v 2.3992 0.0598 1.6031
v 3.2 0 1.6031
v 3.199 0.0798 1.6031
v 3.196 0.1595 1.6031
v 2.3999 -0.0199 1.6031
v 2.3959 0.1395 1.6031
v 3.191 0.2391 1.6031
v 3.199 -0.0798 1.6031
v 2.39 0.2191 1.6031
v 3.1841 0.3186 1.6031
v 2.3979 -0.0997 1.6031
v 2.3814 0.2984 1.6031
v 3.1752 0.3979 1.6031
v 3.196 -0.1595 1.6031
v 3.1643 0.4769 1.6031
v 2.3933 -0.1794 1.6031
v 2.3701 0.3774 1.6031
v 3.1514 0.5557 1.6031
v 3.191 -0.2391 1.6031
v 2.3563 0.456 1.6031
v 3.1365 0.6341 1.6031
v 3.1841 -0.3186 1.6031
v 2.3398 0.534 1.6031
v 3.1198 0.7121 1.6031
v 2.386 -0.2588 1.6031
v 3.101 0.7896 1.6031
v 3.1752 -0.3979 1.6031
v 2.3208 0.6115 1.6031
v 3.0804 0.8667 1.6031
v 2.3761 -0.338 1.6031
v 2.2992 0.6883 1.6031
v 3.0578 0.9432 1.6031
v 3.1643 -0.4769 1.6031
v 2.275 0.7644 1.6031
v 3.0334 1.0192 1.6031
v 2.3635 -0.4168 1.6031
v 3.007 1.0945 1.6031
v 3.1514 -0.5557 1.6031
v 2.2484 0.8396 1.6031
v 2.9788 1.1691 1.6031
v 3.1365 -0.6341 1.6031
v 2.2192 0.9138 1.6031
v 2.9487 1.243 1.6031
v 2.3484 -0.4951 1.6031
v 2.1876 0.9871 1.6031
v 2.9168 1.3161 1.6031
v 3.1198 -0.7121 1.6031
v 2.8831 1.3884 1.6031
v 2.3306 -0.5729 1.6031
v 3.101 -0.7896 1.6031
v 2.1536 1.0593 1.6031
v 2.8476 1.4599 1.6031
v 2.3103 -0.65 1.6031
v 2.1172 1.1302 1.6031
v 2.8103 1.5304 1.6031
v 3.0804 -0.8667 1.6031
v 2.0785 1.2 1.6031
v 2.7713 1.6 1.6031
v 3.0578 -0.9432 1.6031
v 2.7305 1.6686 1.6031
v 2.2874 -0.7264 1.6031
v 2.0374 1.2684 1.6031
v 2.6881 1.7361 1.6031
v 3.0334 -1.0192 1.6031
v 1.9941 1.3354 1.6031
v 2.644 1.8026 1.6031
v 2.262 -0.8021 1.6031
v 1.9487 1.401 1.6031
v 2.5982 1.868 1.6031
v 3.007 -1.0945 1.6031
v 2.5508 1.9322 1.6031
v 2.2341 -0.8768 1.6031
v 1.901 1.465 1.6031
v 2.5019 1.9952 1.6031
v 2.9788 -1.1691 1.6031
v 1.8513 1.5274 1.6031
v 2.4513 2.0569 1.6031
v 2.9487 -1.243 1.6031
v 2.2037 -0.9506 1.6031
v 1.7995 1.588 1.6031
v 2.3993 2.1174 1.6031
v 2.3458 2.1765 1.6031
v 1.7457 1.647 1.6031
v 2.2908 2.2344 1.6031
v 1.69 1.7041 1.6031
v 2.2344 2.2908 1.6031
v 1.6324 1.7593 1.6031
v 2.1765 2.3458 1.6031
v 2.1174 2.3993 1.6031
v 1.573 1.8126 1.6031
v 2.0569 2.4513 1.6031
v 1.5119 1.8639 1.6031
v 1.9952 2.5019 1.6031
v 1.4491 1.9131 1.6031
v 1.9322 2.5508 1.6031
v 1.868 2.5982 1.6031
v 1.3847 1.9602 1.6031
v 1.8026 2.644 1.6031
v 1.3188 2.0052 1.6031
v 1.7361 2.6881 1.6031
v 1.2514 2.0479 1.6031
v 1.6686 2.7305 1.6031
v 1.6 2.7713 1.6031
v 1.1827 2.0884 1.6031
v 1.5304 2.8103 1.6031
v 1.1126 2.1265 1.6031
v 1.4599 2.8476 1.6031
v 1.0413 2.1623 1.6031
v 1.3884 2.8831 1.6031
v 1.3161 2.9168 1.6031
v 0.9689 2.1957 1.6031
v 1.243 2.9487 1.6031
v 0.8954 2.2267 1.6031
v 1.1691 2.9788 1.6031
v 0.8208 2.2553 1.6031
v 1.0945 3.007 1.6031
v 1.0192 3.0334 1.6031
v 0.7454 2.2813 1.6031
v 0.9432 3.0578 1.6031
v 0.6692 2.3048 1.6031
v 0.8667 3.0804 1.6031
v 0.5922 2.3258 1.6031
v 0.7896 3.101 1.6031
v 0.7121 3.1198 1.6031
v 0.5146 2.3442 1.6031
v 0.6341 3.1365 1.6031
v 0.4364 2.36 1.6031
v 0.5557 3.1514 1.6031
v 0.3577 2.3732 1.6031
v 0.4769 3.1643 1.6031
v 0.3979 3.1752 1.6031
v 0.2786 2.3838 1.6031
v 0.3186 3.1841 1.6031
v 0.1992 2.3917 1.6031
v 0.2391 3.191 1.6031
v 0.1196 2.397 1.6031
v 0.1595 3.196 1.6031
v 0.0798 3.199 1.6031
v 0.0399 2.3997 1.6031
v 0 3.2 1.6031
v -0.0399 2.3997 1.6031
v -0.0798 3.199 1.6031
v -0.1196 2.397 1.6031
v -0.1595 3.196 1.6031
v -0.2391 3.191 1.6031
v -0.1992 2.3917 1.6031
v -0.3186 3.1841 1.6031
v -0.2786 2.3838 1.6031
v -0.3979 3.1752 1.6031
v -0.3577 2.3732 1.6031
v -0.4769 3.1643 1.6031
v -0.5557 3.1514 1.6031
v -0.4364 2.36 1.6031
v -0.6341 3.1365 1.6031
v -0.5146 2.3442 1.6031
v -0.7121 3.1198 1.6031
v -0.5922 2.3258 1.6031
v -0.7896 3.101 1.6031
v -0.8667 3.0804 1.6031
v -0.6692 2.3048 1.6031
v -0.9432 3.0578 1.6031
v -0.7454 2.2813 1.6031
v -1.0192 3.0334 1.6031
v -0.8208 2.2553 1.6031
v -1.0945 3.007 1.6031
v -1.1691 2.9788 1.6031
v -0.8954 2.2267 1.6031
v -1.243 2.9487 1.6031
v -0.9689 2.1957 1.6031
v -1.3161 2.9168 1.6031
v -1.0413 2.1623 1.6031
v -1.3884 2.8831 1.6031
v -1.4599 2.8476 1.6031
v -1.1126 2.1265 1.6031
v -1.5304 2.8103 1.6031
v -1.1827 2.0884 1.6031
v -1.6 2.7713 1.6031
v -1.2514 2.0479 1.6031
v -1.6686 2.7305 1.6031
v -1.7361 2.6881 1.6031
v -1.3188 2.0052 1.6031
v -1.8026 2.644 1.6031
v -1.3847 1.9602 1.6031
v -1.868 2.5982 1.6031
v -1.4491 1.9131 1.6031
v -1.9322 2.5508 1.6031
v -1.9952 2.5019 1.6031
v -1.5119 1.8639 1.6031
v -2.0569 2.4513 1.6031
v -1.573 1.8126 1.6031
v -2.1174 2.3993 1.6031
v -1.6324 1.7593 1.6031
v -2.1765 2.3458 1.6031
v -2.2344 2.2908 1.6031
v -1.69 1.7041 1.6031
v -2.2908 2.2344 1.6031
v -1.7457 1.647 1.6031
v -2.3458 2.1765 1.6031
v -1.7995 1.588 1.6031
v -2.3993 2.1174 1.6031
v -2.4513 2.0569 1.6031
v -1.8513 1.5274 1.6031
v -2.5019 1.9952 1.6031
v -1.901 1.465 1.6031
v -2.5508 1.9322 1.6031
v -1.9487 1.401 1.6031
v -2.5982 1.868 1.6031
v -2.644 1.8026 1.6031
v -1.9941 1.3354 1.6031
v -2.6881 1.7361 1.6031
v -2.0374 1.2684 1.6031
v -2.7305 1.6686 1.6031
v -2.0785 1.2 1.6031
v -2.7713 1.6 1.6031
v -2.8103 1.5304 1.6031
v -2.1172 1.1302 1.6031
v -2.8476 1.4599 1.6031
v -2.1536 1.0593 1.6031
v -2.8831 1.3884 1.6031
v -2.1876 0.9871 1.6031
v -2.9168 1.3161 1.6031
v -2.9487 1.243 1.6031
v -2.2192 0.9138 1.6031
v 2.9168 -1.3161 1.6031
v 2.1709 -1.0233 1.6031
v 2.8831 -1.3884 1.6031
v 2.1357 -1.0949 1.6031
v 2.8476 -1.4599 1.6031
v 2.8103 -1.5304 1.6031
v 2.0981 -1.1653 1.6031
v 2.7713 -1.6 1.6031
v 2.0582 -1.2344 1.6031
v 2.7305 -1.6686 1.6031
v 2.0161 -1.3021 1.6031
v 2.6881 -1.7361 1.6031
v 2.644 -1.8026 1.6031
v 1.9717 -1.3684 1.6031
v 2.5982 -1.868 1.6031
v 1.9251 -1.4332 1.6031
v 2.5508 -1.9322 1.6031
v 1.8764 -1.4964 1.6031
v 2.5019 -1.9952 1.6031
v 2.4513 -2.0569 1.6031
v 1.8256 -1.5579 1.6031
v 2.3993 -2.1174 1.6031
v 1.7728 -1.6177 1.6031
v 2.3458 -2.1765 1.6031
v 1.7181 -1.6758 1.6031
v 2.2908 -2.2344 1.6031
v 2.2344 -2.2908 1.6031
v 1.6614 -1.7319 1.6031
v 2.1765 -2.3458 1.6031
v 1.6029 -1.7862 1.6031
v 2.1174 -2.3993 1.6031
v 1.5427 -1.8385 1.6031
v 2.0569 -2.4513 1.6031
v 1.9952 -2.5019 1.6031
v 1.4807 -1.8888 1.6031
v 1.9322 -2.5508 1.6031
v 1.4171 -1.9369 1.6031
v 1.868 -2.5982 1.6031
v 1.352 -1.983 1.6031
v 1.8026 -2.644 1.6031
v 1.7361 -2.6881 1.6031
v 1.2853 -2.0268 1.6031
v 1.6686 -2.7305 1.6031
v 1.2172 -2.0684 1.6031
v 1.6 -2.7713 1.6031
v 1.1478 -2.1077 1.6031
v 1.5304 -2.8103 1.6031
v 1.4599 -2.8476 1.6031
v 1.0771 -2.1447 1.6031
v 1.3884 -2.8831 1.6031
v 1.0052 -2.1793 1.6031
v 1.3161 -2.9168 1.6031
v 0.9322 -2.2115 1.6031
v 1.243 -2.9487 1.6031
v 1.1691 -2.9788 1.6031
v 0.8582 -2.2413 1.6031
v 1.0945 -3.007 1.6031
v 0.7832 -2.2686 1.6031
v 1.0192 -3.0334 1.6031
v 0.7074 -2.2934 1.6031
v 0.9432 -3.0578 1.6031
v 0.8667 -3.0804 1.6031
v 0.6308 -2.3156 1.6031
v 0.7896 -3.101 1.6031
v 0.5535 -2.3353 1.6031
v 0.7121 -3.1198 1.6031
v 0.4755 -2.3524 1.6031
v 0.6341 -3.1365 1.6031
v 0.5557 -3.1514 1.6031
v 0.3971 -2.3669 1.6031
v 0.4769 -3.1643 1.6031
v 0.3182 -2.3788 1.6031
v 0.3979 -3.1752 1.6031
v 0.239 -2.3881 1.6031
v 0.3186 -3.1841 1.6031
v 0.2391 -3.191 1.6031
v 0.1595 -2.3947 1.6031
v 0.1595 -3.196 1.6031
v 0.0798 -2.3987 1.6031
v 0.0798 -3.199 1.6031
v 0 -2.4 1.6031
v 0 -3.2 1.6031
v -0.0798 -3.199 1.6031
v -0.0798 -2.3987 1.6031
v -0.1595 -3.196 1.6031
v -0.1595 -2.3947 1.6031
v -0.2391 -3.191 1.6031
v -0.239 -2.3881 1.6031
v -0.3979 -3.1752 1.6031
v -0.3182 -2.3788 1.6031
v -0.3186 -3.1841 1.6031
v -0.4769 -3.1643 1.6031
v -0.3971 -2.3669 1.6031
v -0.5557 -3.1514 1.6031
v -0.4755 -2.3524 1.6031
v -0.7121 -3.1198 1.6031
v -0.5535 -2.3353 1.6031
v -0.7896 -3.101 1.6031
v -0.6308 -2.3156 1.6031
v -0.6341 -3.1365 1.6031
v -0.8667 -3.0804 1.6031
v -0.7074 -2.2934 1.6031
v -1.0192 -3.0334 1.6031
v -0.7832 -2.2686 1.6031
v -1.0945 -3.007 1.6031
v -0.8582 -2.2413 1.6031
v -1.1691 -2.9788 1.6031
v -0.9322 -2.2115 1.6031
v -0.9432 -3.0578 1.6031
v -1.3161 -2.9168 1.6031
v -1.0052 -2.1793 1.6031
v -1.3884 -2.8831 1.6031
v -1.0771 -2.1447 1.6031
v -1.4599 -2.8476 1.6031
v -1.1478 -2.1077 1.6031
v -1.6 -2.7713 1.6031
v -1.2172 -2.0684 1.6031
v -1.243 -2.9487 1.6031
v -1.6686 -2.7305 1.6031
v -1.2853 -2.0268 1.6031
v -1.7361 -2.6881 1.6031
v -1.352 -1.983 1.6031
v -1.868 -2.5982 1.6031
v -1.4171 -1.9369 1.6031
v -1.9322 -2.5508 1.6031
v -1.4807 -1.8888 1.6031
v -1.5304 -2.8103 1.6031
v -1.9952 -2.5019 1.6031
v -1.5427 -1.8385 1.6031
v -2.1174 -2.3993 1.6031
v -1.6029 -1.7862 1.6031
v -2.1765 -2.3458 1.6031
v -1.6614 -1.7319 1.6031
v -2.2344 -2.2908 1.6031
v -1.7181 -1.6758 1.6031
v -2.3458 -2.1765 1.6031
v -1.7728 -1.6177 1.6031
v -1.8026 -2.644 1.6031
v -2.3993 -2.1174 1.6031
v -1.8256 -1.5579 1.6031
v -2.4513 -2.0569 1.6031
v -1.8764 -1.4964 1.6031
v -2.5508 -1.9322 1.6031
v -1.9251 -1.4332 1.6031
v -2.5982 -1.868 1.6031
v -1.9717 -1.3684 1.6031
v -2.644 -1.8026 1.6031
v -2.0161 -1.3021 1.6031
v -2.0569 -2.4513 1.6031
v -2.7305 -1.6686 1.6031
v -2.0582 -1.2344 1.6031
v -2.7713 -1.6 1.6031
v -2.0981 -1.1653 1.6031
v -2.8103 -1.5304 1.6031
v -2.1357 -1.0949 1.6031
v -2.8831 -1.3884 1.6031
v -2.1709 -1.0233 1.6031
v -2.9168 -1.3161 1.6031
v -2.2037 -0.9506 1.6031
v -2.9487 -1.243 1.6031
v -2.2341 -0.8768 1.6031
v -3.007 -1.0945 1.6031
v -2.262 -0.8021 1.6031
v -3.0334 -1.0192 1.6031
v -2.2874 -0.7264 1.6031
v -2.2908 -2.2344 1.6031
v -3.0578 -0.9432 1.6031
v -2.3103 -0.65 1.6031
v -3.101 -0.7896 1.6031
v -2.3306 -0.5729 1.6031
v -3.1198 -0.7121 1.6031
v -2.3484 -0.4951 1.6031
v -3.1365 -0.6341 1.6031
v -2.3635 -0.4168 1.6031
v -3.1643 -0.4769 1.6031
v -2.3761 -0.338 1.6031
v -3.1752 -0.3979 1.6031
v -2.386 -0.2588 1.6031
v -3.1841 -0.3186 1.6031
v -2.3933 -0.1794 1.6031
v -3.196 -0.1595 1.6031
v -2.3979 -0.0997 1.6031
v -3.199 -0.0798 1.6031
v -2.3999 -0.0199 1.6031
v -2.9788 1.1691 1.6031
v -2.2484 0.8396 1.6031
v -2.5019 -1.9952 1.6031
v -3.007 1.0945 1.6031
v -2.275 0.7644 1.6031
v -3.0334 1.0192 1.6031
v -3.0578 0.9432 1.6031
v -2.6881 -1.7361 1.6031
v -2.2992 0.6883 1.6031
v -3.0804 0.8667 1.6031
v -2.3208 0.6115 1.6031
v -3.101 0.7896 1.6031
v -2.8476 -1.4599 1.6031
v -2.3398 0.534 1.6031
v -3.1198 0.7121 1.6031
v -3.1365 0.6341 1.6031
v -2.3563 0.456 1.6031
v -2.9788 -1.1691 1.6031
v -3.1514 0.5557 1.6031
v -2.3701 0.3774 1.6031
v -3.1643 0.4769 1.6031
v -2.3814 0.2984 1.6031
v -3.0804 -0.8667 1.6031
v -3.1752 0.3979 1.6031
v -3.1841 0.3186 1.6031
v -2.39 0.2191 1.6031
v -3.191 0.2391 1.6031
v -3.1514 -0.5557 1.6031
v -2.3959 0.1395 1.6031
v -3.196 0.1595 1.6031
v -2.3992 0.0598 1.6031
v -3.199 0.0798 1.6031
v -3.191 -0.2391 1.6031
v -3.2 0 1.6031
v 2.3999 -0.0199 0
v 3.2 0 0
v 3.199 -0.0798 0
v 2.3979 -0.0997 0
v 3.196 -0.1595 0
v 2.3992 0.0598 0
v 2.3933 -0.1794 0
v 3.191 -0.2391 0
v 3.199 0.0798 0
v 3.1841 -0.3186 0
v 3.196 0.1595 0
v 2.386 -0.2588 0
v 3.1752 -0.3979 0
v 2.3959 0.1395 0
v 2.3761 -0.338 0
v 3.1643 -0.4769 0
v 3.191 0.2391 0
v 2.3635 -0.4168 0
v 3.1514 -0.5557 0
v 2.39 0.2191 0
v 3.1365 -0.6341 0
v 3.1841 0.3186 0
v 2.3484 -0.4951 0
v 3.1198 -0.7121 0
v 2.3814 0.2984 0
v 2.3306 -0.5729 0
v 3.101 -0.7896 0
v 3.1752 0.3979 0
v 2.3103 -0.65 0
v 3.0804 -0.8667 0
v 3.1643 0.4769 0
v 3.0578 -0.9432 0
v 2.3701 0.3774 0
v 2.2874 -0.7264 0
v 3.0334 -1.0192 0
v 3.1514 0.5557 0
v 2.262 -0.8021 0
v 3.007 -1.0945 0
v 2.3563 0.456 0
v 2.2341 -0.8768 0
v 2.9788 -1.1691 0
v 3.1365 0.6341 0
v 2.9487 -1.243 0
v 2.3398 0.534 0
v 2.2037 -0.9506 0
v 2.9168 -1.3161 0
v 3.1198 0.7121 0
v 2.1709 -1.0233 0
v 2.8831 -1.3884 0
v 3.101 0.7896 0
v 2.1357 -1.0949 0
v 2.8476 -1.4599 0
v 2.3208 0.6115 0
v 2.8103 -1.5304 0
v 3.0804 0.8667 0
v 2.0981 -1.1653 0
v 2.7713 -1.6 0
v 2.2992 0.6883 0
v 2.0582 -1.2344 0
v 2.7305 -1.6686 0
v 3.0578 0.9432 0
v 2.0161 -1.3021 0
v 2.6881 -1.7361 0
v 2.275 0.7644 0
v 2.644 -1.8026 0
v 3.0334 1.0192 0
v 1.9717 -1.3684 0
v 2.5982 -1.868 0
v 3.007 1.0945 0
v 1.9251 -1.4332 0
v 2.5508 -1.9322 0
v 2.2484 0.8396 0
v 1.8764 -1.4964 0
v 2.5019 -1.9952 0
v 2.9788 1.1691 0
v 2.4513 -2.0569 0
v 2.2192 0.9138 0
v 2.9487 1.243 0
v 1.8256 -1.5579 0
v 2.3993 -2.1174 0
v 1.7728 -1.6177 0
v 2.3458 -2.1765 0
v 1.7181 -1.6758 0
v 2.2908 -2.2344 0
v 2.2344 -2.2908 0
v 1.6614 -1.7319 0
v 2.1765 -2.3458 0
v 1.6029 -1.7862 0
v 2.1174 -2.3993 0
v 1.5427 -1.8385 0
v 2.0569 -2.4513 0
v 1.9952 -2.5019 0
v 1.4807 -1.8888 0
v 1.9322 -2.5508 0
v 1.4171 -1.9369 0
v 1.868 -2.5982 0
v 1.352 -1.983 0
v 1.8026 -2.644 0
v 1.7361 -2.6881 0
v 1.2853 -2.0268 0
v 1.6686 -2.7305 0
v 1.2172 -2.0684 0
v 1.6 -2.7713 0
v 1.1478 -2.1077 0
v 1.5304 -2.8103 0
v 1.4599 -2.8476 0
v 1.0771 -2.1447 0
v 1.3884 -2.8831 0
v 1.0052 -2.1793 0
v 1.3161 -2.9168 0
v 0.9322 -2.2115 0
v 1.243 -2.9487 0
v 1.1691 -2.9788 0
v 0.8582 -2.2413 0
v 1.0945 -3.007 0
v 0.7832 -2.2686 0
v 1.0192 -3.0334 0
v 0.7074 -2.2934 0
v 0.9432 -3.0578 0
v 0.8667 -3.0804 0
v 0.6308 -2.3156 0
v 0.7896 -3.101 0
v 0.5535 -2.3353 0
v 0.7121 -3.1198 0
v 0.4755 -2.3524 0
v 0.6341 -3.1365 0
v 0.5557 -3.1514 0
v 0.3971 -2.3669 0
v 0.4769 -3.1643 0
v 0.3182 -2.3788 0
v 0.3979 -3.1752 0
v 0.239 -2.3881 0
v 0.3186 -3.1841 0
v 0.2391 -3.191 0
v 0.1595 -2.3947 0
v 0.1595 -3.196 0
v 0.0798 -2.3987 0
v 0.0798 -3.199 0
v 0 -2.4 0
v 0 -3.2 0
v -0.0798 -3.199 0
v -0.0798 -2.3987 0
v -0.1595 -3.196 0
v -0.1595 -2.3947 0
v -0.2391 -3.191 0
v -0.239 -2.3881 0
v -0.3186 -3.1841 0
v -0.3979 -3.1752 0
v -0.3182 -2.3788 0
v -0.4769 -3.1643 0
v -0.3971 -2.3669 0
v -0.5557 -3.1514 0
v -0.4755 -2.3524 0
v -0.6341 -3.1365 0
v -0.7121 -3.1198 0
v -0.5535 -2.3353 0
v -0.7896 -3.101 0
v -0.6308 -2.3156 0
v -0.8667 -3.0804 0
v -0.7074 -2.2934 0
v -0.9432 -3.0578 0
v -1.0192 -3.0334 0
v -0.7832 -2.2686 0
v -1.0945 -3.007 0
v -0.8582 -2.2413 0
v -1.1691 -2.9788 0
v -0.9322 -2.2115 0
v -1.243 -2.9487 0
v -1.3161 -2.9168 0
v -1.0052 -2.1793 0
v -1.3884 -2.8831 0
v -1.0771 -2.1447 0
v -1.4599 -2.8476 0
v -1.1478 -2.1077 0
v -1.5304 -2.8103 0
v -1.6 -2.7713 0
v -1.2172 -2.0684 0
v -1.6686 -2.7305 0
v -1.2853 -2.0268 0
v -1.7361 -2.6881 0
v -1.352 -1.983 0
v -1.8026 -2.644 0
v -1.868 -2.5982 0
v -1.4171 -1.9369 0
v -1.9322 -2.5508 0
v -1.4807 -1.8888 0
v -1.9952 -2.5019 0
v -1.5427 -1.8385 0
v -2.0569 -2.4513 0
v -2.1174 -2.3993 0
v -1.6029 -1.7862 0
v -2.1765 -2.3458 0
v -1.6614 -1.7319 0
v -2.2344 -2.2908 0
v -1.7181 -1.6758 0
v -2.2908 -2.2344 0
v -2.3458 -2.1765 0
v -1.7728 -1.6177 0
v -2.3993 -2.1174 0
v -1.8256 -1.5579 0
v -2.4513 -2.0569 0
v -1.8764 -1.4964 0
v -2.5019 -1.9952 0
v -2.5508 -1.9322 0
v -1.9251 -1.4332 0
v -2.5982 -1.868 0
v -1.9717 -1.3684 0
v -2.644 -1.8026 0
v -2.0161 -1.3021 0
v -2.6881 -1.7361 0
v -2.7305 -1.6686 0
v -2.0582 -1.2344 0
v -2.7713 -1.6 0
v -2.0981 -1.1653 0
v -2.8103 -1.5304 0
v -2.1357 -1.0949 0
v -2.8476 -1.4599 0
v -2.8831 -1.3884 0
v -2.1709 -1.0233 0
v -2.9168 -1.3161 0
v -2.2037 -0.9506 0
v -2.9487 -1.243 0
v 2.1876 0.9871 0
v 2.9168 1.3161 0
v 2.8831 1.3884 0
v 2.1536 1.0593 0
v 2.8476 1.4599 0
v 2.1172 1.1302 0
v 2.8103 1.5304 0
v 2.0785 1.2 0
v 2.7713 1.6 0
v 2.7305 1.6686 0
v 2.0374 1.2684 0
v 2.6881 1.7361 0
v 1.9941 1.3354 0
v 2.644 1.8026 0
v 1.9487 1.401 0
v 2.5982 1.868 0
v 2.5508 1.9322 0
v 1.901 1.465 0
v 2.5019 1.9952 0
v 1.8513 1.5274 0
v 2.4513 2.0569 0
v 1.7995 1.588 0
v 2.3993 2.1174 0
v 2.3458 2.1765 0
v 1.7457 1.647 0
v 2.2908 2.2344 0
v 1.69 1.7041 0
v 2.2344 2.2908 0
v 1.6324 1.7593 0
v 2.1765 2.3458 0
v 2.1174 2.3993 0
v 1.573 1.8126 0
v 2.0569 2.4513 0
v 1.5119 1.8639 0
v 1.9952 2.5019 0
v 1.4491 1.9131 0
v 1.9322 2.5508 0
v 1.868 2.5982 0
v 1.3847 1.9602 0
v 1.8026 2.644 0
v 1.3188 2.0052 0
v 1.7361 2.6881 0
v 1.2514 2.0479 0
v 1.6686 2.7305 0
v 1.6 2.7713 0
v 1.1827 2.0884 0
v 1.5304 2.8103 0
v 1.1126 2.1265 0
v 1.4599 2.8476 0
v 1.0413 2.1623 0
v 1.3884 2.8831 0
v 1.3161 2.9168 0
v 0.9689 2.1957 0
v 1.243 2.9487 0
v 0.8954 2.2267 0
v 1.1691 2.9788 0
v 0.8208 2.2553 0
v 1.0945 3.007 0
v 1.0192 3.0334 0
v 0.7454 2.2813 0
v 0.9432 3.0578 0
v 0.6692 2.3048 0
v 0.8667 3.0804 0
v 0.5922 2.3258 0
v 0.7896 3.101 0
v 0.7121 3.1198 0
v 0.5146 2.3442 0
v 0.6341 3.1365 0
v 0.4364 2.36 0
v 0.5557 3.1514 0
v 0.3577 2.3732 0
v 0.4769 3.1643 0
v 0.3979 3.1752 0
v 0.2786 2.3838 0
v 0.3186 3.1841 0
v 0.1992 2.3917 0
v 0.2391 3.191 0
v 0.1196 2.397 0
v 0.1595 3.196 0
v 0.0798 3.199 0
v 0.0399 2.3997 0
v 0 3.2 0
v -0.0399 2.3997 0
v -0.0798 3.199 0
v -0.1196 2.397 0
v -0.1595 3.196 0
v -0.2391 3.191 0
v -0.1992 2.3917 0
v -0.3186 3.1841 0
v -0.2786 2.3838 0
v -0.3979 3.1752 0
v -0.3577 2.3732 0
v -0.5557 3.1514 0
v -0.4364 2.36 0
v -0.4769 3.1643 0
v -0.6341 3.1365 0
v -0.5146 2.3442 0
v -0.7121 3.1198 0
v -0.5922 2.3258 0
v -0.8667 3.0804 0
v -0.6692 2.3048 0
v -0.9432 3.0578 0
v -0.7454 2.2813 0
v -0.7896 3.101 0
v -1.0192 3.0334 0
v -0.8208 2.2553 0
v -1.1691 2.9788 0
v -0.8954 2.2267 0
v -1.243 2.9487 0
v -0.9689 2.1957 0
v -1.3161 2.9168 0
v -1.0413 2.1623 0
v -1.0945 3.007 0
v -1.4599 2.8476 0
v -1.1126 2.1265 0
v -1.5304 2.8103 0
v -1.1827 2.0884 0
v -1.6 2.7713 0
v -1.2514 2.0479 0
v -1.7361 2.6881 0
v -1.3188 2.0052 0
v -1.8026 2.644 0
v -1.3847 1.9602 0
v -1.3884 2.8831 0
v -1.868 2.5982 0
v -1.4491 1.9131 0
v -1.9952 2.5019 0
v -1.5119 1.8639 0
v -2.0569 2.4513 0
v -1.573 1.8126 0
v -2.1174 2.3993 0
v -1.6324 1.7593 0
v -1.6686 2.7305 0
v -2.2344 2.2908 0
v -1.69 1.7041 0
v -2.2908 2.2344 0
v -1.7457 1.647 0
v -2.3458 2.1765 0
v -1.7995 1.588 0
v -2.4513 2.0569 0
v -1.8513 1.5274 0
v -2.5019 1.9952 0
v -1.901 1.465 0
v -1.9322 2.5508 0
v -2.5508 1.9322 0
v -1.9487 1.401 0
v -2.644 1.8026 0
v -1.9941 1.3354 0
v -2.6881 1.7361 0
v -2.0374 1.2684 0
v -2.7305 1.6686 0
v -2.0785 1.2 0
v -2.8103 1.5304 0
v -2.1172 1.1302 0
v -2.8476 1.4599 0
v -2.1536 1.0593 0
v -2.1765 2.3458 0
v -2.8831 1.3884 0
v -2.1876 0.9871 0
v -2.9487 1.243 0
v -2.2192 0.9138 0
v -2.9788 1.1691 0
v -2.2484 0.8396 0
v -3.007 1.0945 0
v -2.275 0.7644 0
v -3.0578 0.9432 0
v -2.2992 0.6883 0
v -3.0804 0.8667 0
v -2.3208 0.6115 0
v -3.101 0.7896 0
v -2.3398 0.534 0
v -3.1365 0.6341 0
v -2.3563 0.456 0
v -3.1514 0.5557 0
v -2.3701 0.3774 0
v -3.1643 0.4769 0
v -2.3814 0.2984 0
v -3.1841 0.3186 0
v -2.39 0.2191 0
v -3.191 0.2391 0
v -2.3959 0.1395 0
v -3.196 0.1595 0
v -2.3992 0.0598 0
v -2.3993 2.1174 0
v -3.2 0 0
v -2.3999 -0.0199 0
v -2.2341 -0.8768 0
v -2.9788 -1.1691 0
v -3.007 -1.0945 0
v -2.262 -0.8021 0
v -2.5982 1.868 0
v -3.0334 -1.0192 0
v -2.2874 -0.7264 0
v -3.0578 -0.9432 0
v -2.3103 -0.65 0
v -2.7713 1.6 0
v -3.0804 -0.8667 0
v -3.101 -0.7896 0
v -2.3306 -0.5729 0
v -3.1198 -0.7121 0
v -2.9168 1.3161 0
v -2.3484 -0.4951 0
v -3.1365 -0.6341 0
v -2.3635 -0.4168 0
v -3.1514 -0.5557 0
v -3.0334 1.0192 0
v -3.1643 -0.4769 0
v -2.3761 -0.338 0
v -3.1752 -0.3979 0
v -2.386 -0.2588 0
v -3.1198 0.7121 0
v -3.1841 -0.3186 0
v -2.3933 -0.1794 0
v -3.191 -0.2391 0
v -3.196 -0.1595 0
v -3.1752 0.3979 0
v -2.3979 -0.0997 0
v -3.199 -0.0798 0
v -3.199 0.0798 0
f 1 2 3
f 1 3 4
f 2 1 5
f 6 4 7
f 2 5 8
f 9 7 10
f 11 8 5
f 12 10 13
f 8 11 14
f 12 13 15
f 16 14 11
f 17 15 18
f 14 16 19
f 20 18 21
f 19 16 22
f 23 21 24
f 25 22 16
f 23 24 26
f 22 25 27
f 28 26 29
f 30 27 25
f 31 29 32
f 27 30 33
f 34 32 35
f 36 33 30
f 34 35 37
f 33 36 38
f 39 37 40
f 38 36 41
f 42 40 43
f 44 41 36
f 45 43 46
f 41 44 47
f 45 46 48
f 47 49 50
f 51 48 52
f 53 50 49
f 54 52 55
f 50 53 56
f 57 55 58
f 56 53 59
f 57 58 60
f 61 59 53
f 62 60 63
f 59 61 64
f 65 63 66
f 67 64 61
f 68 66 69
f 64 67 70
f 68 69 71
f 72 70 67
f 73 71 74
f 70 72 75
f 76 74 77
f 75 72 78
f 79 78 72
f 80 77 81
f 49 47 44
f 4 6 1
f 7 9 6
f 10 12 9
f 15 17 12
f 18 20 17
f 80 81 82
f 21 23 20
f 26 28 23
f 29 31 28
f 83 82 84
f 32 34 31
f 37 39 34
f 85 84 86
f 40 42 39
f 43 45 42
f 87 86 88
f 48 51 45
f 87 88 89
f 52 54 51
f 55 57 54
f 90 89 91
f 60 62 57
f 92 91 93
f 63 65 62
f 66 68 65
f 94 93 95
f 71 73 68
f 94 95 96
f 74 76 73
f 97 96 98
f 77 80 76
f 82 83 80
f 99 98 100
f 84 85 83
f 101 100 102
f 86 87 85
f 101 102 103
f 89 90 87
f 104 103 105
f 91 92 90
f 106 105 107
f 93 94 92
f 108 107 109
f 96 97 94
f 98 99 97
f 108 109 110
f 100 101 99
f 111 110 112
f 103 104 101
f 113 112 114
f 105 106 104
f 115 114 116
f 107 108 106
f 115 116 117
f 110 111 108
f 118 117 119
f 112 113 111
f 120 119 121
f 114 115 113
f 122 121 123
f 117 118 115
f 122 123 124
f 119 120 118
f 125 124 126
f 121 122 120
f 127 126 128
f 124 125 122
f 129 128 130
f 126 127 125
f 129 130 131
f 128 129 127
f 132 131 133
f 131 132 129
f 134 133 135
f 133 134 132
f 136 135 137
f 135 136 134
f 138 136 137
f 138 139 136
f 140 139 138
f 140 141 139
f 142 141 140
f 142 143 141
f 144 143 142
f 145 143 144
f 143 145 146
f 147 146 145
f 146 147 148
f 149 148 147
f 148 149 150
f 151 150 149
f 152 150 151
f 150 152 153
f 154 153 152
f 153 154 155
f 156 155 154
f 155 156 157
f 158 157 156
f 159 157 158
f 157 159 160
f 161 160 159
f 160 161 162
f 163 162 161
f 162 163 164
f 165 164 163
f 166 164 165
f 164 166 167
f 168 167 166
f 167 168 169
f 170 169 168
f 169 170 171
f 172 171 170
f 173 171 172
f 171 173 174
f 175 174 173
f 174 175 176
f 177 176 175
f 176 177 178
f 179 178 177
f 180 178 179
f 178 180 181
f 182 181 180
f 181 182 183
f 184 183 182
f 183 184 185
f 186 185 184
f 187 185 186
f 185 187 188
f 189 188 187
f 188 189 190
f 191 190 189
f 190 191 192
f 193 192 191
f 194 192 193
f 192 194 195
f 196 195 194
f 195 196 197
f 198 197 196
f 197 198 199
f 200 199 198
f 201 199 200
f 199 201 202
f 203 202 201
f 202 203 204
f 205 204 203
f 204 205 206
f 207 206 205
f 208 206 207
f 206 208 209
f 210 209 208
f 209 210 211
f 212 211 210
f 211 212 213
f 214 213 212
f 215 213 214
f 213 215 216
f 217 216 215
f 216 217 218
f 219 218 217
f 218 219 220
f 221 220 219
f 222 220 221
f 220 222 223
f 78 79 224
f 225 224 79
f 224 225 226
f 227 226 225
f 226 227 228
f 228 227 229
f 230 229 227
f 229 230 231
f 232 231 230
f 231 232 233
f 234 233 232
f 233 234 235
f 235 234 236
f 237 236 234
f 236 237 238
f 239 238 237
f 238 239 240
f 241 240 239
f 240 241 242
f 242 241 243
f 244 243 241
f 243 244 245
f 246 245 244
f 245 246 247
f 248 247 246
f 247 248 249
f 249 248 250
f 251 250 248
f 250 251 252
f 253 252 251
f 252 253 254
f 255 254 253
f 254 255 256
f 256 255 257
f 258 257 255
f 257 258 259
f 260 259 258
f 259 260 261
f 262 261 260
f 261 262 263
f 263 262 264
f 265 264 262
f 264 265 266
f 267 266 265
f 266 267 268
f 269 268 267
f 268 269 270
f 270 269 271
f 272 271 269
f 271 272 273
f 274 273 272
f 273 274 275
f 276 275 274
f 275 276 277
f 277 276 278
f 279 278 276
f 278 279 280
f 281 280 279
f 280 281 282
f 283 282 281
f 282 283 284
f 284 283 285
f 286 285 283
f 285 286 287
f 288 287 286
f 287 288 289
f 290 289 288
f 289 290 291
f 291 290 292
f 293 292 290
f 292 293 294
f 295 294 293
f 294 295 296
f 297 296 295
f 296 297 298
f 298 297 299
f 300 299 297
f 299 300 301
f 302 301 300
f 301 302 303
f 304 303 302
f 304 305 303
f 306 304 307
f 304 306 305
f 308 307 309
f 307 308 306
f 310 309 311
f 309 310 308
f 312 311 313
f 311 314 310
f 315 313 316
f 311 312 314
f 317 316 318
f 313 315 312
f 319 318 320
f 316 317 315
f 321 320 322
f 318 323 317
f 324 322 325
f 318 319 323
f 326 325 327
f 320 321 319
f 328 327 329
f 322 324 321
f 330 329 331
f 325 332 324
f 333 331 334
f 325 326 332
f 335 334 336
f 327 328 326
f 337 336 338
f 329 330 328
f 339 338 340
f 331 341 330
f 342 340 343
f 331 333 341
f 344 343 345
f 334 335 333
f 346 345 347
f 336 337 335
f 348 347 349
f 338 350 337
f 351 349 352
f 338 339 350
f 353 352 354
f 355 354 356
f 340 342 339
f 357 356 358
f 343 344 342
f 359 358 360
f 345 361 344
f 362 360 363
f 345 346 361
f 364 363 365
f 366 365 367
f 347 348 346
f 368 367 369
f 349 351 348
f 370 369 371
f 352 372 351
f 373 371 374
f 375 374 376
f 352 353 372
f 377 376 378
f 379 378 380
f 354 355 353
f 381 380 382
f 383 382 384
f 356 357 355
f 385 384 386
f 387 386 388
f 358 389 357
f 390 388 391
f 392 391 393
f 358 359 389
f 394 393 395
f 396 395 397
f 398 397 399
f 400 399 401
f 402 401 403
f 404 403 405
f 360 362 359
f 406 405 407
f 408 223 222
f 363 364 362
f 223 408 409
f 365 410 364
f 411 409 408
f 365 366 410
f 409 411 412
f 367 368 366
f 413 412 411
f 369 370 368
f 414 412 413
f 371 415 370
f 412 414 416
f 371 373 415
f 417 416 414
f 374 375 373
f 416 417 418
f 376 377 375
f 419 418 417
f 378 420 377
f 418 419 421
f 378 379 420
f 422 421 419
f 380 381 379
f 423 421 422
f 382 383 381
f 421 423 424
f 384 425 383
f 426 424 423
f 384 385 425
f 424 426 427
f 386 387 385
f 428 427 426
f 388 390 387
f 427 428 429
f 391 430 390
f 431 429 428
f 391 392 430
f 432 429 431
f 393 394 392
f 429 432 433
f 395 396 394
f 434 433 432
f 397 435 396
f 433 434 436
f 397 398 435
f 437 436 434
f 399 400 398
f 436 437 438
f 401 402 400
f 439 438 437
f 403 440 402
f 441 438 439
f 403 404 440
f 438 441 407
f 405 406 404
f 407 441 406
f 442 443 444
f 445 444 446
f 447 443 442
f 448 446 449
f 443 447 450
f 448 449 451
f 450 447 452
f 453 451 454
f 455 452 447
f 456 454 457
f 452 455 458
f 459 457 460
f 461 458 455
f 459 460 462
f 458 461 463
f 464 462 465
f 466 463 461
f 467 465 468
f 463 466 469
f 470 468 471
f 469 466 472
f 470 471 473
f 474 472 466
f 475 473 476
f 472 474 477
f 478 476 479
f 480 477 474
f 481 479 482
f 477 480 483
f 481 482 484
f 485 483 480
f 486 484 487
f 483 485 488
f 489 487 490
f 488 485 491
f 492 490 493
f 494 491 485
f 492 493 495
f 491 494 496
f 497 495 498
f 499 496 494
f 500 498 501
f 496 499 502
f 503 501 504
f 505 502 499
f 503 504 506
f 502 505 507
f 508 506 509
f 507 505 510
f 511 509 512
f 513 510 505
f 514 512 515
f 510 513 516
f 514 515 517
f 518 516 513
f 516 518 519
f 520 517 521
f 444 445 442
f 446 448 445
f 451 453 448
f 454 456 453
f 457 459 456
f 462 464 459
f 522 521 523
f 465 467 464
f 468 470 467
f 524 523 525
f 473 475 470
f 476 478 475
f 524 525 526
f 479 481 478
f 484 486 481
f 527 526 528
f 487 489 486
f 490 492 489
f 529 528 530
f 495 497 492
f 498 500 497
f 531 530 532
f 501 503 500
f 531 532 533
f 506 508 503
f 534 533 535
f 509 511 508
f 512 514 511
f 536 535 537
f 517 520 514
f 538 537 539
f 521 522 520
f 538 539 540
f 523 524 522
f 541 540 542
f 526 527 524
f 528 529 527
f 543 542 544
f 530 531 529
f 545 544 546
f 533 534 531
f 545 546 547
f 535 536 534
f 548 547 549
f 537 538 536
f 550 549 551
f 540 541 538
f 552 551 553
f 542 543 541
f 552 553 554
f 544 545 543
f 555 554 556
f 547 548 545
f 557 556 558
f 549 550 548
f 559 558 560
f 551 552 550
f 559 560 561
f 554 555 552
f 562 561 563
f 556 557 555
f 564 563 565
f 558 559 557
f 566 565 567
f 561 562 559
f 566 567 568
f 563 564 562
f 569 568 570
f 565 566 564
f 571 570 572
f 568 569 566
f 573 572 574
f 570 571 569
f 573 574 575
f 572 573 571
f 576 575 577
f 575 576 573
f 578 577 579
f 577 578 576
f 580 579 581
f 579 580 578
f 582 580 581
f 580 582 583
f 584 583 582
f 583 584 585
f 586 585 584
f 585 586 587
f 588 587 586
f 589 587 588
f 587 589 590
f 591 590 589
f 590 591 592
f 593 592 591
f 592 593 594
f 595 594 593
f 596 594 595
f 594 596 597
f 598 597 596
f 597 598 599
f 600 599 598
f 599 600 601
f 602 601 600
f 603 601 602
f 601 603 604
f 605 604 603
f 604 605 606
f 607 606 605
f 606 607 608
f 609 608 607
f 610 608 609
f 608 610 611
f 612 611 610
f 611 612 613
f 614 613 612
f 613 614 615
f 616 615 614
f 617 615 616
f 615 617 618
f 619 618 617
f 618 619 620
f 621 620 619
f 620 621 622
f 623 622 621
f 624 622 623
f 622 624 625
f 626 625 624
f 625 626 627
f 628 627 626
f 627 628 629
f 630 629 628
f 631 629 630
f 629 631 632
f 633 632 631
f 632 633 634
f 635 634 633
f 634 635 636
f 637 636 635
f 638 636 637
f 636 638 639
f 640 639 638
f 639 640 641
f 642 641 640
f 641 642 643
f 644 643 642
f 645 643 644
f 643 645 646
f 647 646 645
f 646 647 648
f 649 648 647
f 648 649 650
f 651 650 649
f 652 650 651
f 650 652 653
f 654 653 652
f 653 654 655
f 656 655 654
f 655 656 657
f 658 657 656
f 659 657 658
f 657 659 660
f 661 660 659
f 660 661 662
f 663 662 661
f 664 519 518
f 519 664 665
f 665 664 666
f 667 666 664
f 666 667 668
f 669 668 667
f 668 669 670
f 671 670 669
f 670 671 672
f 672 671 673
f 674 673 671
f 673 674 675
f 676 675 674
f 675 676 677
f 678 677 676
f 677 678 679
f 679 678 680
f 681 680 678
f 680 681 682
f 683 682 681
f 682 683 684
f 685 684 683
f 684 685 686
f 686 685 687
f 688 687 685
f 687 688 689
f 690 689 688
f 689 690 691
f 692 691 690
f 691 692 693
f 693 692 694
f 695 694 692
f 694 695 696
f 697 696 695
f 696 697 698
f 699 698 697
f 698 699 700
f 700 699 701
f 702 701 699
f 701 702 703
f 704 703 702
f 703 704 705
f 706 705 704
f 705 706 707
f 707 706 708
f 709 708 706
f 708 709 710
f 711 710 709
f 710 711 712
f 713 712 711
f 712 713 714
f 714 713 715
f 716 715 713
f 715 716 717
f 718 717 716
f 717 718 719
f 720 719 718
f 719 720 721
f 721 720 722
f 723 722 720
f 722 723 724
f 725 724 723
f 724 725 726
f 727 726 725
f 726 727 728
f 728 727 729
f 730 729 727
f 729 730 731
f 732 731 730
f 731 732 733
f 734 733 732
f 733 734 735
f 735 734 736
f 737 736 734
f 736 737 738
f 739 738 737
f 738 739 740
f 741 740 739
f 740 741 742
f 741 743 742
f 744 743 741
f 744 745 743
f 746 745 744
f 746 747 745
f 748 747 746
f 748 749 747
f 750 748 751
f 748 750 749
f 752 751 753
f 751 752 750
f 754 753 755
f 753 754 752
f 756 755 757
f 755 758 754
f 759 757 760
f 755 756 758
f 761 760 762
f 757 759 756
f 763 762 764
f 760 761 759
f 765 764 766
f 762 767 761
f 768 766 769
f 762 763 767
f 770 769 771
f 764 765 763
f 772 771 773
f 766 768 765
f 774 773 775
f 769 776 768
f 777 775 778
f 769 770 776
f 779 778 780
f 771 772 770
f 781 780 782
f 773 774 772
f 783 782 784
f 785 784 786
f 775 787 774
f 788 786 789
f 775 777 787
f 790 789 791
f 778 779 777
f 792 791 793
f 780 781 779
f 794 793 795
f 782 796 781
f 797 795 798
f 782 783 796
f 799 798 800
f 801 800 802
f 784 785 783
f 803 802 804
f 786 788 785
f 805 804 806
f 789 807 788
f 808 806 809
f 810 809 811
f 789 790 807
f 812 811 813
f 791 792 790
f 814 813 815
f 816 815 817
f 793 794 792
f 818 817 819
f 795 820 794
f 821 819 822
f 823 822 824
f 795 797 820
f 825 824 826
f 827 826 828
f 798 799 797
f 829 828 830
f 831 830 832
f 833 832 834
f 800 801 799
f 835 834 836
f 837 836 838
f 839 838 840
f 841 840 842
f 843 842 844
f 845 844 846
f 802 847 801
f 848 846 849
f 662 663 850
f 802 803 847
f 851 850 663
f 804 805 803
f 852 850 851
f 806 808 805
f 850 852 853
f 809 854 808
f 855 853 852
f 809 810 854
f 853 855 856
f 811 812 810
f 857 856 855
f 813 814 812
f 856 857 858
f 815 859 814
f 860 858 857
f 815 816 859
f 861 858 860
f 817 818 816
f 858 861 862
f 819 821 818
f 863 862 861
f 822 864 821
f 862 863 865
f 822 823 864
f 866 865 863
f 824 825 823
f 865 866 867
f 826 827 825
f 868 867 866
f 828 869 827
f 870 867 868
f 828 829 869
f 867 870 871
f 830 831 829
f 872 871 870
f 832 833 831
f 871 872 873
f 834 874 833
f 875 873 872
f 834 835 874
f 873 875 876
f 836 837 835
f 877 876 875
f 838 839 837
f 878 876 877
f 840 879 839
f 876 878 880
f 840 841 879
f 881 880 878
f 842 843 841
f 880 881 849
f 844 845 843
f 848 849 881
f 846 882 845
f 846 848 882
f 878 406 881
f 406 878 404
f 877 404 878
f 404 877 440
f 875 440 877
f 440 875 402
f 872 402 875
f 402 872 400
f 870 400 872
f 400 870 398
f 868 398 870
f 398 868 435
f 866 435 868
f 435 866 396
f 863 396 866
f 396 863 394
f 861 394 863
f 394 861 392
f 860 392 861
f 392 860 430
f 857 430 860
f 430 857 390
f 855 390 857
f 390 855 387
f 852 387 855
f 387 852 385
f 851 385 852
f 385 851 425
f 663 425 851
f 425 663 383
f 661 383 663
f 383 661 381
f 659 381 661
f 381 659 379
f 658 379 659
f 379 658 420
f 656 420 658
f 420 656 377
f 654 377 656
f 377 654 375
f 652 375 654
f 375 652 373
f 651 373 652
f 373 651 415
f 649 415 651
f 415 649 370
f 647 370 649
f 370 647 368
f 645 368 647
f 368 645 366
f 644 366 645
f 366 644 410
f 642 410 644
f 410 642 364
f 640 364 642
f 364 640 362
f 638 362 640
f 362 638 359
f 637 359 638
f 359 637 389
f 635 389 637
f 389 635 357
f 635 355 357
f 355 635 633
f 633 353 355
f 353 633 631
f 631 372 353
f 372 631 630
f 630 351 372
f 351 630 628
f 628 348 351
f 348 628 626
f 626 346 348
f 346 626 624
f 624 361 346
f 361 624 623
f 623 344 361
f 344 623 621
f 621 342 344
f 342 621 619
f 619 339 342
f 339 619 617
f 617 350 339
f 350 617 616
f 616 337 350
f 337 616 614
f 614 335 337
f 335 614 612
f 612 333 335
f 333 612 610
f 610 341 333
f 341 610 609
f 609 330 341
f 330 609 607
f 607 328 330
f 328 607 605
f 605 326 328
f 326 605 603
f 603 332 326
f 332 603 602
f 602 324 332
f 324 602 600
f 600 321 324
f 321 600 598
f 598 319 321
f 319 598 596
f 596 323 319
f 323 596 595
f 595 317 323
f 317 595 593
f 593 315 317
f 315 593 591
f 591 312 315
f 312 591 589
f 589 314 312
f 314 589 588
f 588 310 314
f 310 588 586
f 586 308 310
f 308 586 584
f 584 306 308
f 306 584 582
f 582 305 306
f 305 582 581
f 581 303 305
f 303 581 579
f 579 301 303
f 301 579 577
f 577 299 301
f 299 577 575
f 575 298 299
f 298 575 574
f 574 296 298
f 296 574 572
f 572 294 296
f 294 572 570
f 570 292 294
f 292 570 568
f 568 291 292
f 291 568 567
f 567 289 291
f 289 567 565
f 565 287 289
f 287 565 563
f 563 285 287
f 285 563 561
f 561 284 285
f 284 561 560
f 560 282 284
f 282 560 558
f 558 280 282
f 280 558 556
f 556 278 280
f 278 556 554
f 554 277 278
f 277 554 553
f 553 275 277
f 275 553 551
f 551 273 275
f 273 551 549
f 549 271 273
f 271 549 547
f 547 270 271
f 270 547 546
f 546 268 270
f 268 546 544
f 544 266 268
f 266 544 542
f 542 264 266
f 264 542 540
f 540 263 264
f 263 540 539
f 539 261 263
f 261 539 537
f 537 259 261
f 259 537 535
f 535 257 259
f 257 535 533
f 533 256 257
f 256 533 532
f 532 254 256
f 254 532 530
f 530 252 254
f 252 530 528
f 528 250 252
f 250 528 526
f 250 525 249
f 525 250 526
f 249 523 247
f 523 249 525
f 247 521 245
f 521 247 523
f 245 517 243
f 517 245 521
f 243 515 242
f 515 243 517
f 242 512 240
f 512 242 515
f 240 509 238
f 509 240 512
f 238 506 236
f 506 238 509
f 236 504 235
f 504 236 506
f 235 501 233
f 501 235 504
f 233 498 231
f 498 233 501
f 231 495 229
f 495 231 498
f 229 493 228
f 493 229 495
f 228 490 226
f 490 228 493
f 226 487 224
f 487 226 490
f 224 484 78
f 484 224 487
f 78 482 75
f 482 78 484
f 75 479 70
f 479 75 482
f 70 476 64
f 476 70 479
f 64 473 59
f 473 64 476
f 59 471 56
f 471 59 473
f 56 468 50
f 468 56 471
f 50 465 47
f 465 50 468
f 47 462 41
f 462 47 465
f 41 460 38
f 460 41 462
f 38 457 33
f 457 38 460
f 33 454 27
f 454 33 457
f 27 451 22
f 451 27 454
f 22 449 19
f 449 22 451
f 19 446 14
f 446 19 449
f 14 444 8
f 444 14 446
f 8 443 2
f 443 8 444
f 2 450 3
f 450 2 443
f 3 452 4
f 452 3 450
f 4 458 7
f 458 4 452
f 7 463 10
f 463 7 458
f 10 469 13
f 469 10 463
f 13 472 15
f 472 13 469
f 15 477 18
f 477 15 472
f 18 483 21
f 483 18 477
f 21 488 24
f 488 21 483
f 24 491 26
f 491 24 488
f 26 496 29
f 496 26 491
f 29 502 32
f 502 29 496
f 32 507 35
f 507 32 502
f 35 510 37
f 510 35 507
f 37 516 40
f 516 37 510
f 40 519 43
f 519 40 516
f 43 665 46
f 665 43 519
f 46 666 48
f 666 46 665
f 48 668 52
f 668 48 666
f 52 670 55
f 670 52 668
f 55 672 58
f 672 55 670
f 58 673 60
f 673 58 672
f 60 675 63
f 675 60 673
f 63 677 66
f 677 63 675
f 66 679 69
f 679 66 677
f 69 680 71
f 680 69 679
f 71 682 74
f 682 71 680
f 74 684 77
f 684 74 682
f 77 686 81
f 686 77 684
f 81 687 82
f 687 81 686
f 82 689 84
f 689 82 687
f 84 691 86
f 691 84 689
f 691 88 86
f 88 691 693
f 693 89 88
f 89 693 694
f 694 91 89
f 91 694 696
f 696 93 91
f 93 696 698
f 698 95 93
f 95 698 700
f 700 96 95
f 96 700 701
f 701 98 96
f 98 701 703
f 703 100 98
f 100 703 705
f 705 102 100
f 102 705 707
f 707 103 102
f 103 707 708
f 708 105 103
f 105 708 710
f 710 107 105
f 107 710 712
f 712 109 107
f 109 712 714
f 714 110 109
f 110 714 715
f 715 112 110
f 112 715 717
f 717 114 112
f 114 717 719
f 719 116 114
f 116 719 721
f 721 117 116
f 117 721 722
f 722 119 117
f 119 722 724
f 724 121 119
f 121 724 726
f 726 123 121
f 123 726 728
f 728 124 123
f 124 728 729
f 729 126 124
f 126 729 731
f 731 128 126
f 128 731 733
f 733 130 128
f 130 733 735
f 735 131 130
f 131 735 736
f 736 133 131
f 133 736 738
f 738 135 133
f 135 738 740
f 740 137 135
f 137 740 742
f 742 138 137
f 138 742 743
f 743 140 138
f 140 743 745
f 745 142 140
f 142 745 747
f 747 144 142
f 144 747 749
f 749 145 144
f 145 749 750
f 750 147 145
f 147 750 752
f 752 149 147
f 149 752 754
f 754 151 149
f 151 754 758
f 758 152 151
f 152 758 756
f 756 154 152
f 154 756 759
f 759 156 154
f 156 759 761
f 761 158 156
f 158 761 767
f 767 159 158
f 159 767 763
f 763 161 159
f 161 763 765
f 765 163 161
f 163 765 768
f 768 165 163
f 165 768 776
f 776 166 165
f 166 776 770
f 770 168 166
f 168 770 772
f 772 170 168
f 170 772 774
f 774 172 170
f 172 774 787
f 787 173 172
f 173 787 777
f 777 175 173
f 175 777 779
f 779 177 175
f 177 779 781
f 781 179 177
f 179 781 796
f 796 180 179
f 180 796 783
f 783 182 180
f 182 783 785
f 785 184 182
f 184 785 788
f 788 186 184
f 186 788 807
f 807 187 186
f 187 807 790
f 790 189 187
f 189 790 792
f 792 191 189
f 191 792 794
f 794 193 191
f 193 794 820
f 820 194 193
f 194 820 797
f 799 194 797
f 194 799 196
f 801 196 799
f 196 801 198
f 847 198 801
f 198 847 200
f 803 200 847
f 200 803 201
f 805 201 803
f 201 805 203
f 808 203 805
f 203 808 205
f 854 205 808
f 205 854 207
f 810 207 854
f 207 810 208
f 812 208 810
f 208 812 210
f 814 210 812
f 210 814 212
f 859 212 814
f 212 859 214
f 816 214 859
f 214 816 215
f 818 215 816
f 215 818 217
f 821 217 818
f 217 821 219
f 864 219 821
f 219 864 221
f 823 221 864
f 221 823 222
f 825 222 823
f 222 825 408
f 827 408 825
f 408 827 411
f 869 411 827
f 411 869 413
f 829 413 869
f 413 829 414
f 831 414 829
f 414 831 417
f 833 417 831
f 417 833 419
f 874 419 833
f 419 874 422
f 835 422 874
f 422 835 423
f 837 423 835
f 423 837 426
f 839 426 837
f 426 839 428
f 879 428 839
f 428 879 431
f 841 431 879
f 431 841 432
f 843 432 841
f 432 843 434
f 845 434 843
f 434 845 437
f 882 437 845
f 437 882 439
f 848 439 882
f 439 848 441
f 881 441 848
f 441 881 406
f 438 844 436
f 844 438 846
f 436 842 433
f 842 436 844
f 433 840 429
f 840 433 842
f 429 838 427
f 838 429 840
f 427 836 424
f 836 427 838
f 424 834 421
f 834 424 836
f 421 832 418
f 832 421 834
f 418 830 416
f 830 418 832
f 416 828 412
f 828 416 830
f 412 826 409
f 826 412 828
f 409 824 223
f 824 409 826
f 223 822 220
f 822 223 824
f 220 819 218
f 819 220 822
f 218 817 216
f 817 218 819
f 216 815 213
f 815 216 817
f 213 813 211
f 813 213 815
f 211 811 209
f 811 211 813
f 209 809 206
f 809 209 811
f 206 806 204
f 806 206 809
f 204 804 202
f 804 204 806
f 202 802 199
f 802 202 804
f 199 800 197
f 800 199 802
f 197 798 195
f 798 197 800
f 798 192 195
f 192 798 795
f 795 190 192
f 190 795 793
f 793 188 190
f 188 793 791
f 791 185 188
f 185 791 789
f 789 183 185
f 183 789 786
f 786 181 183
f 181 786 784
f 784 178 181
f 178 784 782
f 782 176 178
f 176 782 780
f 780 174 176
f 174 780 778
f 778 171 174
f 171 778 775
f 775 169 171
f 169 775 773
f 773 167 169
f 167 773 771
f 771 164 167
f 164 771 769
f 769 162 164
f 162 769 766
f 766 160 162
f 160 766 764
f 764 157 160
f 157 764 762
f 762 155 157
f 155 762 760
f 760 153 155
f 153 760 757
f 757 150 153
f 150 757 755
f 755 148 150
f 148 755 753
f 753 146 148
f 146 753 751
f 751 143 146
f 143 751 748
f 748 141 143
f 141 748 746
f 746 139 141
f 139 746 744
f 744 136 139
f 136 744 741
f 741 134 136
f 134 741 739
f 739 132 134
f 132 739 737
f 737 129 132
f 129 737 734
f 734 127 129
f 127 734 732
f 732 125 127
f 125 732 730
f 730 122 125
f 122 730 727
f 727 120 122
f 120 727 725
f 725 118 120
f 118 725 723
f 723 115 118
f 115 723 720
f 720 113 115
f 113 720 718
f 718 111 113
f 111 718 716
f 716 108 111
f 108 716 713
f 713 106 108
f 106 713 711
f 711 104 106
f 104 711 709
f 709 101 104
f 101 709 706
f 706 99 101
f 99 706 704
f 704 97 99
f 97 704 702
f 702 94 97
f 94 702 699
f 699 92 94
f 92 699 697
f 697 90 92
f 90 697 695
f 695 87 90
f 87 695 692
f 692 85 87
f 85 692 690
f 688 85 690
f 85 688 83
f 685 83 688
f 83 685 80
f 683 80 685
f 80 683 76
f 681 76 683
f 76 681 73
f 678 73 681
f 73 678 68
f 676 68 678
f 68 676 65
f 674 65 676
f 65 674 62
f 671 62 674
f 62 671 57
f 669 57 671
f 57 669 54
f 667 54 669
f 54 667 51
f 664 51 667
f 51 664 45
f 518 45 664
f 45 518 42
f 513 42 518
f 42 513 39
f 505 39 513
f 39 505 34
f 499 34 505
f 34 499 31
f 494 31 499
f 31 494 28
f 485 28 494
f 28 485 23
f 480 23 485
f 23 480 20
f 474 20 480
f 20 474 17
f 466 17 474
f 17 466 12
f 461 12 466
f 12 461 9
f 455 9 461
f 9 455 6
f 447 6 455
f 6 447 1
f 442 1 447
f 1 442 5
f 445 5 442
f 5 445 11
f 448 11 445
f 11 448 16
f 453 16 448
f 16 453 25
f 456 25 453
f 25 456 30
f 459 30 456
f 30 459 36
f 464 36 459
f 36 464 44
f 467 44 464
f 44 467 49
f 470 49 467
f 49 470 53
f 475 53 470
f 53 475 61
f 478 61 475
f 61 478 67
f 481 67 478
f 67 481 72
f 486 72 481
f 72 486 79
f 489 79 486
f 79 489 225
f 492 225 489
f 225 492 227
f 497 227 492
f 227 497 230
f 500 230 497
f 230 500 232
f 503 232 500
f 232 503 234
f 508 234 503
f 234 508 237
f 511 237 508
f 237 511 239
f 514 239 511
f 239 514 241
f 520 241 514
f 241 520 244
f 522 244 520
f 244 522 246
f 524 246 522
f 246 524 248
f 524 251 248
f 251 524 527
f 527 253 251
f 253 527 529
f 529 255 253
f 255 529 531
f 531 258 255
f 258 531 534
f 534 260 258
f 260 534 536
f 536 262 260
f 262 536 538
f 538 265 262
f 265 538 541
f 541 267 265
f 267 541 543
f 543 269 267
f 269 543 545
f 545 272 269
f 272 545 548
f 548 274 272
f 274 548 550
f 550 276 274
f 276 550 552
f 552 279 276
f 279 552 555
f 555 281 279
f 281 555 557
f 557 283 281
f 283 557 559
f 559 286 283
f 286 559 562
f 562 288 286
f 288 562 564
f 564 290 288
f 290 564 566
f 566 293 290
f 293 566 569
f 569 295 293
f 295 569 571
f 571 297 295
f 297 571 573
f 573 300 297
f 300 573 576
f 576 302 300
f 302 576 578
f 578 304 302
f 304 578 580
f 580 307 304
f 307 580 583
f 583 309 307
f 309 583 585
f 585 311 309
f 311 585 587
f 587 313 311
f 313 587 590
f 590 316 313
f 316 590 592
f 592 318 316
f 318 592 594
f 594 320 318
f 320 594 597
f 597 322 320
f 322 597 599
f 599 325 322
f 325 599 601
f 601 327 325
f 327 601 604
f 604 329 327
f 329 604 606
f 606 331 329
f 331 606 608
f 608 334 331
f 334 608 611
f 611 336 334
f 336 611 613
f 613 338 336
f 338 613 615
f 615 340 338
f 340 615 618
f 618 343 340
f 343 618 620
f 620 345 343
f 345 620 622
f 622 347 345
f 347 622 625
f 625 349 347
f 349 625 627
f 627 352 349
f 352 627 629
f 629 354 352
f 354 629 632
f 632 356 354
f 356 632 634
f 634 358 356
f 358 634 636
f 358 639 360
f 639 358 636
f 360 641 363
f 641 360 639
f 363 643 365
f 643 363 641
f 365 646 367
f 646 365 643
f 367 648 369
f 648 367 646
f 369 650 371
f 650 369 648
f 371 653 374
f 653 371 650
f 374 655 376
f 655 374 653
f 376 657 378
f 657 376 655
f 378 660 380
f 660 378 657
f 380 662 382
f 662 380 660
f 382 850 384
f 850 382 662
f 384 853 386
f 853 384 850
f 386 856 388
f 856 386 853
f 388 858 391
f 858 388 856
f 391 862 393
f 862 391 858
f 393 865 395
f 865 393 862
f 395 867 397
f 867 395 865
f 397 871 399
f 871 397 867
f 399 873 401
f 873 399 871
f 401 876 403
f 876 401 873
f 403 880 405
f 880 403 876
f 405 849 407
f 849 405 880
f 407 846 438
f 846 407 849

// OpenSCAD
use <../lib.scad>
use <2446.scad>
$fa=1; $fs=0.2;
function ldraw_lib__4298609(realsolid=false) = [
// 0 ~_Minifig Helmet Modern White (Obsolete)
// 0 Name: 4298609.dat
// 0 Author: Michael Heidemann [mikeheide]
// 0 !LDRAW_ORG Part Physical_Colour UPDATE 2019-02
// 0 !LICENSE Licensed under CC BY 2.0 and CC BY 4.0 : see CAreadme.txt
// 
// 0 BFC CERTIFY CCW
  [0,"BFC","CERTIFY"],
  [0,"BFC","CCW"],
// 
// 0 !HISTORY 2010-12-31 [PTadmin] Official Update 2010-03
// 0 !HISTORY 2019-08-25 [Holly-Wood] Obsoleted per decision not to include physical colour parts
// 0 !HISTORY 2019-09-09 [PTadmin] Official Update 2019-02
// 
// 
// 0 // This file is a "shortcut" with the correct number for the actual
// 0 // colouring of the part (White).
// 
// 1 15 0 0 0 1 0 0 0 1 0 0 0 1 2446.dat
  [1,15,0,0,0,1,0,0,0,1,0,0,0,1, ldraw_lib__2446(realsolid)],
];
module ldraw_lib__4298609(step=0, col=false, unit=2/5, alt=false, line=0.2, solid=!$preview)
    makepoly(ldraw_lib__4298609(solid), step=step, col=col, unit=unit, alt=alt, line=line, solid=solid);
ldraw_lib__4298609(line=0.2);
